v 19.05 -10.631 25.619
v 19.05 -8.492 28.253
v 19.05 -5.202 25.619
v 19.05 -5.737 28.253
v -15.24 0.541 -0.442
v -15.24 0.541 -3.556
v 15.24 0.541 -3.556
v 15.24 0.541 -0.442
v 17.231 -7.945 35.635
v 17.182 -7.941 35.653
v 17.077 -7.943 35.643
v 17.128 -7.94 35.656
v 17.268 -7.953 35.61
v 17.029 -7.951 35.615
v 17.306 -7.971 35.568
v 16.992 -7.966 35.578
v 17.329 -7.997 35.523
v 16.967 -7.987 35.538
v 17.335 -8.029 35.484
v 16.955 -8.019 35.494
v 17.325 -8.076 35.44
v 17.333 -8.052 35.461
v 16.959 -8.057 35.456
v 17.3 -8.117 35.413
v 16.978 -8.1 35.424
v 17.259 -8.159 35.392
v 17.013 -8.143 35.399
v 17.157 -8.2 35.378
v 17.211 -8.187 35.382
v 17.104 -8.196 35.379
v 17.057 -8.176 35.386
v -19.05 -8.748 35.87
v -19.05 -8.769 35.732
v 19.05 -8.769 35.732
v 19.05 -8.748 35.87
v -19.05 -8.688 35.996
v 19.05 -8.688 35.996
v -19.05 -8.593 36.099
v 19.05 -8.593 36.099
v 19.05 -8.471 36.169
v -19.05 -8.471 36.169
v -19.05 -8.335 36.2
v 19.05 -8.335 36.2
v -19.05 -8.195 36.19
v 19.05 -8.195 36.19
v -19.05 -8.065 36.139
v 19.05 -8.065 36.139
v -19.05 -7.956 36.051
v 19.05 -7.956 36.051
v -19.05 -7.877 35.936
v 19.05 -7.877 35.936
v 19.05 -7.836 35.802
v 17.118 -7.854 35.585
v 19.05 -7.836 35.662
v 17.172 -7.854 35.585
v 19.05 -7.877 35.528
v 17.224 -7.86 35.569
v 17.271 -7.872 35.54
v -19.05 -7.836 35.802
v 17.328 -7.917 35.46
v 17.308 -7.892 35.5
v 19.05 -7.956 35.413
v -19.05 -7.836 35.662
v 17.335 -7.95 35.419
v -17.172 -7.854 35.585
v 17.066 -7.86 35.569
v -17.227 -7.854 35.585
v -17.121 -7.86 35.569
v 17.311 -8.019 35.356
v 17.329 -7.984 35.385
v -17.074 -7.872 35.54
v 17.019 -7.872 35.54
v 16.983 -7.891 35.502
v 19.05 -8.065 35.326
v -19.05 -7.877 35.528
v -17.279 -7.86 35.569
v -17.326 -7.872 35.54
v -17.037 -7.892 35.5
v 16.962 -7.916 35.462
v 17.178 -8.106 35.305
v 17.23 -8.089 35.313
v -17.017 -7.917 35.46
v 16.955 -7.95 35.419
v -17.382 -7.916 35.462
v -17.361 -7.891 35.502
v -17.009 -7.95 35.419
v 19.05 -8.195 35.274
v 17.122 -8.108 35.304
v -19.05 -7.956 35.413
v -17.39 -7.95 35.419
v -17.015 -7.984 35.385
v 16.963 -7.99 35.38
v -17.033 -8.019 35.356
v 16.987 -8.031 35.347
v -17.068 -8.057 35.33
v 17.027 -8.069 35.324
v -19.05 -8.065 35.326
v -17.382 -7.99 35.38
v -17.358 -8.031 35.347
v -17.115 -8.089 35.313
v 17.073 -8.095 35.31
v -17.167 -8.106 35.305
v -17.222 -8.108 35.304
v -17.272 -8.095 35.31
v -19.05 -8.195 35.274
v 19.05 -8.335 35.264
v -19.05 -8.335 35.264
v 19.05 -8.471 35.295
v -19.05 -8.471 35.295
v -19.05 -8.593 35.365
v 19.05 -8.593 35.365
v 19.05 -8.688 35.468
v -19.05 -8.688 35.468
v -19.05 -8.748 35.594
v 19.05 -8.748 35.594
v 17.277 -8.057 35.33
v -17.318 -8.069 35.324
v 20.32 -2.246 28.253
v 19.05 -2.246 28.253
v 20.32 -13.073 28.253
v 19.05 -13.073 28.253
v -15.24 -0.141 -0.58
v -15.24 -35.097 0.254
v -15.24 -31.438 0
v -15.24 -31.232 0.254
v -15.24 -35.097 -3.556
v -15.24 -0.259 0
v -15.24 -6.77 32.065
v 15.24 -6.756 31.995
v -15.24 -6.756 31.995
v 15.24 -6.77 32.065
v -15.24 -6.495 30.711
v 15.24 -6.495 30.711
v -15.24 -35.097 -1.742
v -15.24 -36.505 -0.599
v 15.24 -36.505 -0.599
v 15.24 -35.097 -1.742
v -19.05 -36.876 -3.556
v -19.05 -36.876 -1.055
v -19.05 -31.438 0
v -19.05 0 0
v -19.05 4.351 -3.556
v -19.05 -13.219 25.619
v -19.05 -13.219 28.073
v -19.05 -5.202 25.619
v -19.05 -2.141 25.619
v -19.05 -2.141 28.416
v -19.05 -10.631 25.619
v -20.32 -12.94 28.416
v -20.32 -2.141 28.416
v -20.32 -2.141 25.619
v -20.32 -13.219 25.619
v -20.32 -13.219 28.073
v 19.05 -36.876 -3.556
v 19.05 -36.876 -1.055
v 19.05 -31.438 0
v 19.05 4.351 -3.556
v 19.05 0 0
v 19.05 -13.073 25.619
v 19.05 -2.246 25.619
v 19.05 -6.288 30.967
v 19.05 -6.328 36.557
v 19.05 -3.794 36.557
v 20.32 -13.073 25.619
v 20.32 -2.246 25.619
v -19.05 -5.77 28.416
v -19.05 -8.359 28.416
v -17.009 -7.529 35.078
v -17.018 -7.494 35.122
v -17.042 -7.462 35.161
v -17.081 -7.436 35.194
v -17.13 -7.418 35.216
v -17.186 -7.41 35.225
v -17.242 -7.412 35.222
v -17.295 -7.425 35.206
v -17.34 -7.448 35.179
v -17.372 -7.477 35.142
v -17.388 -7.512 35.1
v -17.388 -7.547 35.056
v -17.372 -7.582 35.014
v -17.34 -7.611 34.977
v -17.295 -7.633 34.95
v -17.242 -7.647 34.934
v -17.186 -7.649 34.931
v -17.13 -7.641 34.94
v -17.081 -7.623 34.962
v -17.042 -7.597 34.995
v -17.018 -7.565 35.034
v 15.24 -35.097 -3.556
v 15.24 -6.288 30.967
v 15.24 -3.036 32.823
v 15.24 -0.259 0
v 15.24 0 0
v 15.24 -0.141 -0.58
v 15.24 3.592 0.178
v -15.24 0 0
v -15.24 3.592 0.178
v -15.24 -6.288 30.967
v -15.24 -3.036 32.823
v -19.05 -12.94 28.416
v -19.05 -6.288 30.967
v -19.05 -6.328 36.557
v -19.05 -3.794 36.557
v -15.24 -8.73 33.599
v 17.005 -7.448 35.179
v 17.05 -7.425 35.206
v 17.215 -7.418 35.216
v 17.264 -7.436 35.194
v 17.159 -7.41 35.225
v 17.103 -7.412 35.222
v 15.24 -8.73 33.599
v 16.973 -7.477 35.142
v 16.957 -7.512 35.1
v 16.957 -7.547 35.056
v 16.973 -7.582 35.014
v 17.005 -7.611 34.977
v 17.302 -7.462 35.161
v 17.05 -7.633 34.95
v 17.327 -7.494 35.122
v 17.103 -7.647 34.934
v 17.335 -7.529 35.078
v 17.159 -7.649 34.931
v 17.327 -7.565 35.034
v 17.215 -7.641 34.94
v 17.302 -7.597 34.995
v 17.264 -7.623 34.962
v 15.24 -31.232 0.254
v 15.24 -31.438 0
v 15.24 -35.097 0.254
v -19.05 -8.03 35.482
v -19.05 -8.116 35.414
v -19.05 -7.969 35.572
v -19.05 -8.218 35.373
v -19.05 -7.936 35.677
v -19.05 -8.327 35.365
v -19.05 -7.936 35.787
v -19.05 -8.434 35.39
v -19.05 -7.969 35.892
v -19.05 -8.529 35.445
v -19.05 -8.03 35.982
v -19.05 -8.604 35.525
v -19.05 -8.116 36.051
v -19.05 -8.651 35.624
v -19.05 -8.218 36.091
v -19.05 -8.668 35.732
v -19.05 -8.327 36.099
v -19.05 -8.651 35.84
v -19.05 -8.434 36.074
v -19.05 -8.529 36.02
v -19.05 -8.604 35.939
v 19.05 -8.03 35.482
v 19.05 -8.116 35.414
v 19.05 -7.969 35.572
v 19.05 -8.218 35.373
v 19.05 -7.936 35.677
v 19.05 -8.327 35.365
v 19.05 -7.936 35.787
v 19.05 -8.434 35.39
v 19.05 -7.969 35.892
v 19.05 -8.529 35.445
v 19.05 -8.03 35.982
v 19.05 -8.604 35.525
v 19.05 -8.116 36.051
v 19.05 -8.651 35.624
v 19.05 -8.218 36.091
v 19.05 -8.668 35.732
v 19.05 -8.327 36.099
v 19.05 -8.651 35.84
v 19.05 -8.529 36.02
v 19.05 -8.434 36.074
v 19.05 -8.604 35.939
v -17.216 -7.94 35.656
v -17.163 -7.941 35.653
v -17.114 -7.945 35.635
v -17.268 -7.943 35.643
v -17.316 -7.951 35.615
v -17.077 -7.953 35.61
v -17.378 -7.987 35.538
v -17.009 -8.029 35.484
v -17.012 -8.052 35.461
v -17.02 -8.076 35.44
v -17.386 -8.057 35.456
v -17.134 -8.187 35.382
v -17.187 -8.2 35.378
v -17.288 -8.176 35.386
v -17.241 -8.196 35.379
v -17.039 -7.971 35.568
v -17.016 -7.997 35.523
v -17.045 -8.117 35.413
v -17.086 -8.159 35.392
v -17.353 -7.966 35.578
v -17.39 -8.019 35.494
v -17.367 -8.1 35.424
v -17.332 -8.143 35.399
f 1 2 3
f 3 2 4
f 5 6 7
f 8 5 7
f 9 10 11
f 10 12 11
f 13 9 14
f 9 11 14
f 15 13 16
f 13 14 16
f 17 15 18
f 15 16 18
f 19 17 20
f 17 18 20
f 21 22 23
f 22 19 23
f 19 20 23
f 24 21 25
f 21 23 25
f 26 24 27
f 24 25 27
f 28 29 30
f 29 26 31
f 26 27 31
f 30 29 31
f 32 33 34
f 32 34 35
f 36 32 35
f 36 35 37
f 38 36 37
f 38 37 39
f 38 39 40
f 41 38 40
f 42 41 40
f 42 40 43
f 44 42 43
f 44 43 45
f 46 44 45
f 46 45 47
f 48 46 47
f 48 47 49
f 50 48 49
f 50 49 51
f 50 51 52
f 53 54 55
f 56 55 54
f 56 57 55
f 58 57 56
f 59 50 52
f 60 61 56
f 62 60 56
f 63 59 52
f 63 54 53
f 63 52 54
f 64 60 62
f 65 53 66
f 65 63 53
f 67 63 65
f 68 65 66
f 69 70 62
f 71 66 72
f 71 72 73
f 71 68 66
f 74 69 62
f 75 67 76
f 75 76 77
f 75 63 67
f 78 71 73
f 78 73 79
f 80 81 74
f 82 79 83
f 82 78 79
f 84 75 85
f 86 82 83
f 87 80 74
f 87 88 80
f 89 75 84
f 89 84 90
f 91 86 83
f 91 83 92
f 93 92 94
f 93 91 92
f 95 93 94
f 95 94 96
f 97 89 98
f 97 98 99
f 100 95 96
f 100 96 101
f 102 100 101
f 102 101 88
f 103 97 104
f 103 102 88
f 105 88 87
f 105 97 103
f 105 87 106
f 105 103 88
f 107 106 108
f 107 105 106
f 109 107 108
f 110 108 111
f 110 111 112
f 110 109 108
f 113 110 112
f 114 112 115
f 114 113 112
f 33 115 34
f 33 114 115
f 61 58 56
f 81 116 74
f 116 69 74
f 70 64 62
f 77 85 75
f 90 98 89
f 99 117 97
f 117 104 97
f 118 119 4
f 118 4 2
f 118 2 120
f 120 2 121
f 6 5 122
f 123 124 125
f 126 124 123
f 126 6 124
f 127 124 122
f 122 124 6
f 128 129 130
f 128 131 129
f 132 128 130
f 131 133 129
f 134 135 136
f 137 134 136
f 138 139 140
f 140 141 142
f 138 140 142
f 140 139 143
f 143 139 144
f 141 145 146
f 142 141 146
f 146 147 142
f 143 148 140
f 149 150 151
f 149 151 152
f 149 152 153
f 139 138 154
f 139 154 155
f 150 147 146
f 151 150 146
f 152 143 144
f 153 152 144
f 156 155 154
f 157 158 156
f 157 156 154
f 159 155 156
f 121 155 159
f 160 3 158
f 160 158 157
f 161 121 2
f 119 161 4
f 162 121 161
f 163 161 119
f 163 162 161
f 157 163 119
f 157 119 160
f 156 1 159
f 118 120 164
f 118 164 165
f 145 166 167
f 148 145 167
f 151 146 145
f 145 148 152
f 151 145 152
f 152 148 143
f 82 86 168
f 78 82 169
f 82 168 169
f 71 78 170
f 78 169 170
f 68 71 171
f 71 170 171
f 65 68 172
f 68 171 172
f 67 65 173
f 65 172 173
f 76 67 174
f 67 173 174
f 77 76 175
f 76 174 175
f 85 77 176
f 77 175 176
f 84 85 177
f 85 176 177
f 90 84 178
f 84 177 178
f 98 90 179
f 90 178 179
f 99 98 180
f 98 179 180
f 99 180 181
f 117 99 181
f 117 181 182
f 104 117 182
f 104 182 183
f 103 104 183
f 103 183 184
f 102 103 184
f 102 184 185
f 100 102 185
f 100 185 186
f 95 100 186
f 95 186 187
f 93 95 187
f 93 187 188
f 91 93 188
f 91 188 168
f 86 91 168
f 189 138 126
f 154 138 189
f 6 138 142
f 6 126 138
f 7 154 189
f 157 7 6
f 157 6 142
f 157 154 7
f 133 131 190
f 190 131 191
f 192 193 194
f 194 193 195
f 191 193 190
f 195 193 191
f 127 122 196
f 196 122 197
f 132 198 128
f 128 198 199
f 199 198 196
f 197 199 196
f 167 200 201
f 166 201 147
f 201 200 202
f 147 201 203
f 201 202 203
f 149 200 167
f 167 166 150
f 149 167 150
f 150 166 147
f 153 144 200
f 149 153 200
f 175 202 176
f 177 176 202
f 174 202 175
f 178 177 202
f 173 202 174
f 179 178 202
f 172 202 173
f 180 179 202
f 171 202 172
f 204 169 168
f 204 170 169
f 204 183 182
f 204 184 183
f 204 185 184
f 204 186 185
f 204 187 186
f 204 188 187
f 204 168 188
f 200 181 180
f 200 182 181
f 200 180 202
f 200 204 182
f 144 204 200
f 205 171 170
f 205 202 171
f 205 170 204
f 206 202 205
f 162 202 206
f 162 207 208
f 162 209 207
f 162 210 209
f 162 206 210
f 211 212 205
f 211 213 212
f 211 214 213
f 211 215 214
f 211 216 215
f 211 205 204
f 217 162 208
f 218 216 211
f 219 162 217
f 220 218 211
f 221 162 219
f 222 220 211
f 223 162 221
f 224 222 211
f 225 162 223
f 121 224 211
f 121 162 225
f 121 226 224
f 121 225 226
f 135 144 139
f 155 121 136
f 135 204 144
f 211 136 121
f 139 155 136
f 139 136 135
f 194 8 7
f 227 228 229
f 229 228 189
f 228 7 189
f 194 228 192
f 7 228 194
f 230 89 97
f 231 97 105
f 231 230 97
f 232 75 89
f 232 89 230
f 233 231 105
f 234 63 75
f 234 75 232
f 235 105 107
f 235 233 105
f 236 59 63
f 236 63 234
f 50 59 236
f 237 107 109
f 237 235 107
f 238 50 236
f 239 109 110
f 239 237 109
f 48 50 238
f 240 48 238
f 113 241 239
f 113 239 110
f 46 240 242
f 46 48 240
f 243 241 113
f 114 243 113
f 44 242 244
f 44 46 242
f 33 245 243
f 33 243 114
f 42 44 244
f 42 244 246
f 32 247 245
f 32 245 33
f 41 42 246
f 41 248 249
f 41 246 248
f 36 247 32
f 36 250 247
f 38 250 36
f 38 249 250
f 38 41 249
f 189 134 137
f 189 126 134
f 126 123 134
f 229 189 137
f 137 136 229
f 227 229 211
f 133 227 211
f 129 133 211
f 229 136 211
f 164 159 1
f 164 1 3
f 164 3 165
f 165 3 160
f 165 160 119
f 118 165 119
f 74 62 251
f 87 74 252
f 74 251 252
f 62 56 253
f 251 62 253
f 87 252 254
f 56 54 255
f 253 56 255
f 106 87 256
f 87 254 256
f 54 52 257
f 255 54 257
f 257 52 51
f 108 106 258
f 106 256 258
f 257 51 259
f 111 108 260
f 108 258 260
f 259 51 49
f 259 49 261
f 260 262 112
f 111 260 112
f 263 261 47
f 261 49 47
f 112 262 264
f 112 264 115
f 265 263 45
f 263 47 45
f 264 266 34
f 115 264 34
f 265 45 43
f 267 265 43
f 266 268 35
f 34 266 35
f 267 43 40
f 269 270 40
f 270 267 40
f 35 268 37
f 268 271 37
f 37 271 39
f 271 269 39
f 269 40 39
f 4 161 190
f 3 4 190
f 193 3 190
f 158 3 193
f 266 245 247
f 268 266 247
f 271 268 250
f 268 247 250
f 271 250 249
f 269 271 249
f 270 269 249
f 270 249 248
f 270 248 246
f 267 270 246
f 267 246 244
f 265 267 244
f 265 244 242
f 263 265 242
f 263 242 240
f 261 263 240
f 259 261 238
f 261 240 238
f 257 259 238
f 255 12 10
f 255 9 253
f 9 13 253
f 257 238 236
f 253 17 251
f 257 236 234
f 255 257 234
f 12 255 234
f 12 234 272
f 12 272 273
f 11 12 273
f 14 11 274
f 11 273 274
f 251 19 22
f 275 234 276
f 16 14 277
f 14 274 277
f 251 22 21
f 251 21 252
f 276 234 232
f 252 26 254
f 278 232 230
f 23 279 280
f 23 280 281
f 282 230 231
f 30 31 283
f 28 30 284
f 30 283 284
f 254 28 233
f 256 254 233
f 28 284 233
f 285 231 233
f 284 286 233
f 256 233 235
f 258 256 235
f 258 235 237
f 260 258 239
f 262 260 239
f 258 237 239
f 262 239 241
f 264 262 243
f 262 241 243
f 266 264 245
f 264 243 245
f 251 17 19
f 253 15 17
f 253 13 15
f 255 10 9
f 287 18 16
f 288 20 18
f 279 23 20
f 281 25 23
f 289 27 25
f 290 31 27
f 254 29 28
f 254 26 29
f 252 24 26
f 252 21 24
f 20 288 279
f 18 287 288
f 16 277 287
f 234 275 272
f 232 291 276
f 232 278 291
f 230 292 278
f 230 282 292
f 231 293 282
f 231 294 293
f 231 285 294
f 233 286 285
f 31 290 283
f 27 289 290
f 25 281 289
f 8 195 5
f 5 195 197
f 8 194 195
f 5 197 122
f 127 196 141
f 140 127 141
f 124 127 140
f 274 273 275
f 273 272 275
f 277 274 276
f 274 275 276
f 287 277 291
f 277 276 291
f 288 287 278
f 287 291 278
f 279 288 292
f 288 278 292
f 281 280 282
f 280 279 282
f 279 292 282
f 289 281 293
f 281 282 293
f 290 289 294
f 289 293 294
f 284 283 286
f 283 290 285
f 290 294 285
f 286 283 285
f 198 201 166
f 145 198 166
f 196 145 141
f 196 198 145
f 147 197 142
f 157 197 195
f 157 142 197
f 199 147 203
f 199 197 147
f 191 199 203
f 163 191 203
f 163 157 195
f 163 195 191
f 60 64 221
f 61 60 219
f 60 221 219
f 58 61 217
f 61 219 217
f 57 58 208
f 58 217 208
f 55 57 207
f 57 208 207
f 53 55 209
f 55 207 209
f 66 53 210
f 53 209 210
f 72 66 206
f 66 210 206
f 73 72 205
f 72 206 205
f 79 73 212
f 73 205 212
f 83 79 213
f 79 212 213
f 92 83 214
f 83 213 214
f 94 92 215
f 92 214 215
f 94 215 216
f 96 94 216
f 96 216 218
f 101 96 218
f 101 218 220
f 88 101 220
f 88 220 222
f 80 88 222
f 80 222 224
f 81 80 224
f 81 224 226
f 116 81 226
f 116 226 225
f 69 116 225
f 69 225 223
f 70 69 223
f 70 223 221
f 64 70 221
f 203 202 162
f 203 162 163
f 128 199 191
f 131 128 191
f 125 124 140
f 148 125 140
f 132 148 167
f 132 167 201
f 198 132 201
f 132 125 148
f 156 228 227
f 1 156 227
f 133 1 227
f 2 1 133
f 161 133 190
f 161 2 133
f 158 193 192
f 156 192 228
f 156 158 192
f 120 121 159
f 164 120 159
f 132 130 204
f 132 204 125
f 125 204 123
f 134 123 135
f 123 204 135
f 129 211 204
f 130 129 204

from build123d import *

# Parameters (mm, degrees)
F1_DEPTH  = 19.05
F3_DEPTH  = 50.8
F6_DEPTH  = 1.27
F7_DEPTH  = 1.27
F9_DEPTH  = 4.064
F11_DEPTH = 3.81
F12_W     = 30.4800014411
F12_H     = 35.6379195737
F13_DEPTH = 3.81
F14_R     = 0.1905
F15_DEPTH = 1.016
F17_DEPTH = 50.8
F18_R     = 0.4693884444
F18_R_2   = 0.3677883594
F19_DEPTH = 38.0999
F20_DEPTH = 42.8752


with BuildPart() as f1:
    # F0 (on Right) → F1 (new body, symmetric)
    with BuildSketch(Plane.YZ):
        Polygon((-4.300991216, 39.0530479294), (-38.9073263628, -3.5559992527), (4.3505917698, -3.5559992527), align=None)
        Polygon((-6.2876227312, 30.9665426612), (0, 0), (-31.4381159842, 0), align=None, mode=Mode.SUBTRACT)
    extrude(amount=F1_DEPTH, both=True)

    # F2 (on face) → F3 (cut)
    with BuildSketch(Plane.YZ.offset(19.05)):
        Polygon((-6.3284697347, 36.5567151771), (-3.7941216332, 36.5567151771), (-4.300991216, 39.0530479294), align=None)
    extrude(amount=-F3_DEPTH, mode=Mode.SUBTRACT)

    # F5 (on face) → F6 (join)
    with BuildSketch(Plane(origin=(-19.05, 0, 0), x_dir=(0, -1, 0), z_dir=(-1, 0, 0))):
        Polygon((5.7698168155, 28.4163484679), (2.1412553343, 28.4163484679), (2.1412553343, 25.6189145148), (5.2018099345, 25.6189145148), align=None)
        Polygon((8.3588465857, 28.4163484679), (5.7698168155, 28.4163484679), (5.2018099345, 25.6189145148), (10.6308743201, 25.6189145148), align=None)
        Polygon((12.9399355427, 28.4163484679), (8.3588465857, 28.4163484679), (10.6308743201, 25.6189145148), (13.2188182324, 25.6189145148), (13.2188182324, 28.0729741801), align=None)
    extrude(amount=F6_DEPTH)

    # F4 (on face) → F7 (join)
    with BuildSketch(Plane.YZ.offset(19.05)):
        Polygon((-8.4918548826, 28.2525820137), (-13.0729438396, 28.2525820137), (-13.0729438396, 25.6189145148), (-10.6308743201, 25.6189145148), align=None)
        Polygon((-2.2463577334, 28.2525820137), (-5.7365647443, 28.2525820137), (-5.2018099345, 25.6189145148), (-2.2463577334, 25.6189145148), align=None)
        Polygon((-5.7365647443, 28.2525820137), (-8.4918548826, 28.2525820137), (-10.6308743201, 25.6189145148), (-5.2018099345, 25.6189145148), align=None)
    extrude(amount=F7_DEPTH)

    # F8 (on face) → F9 (cut)
    with BuildSketch(Plane(origin=(0, -21.7030111813, 17.6268123393), x_dir=(1, 0, 0), z_dir=(0, -0.7762344906, 0.6304443002))):
        Polygon((-15.2399991697, 13.4574822013), (-15.2399991697, -23.4791905796), (15.2399991697, -23.4791905796), (15.2399991697, 13.688865676), (15.2399991697, 13.8253802434), (15.2399991697, 20.5768346786), (-15.2399991697, 20.5768346786), (-15.2399991697, 13.8998411689), align=None)
    extrude(amount=-F9_DEPTH, mode=Mode.SUBTRACT)

    # F10 (on face) → F11 (cut)
    with BuildSketch(Plane(origin=(0, 3.4848880888, 0.7075914739), x_dir=(-1, 0, 0), z_dir=(0, 0.9800024806, 0.1989852707))):
        Polygon((15.2400027211, 32.7706485987), (-15.2400027211, 32.7706485987), (-15.2400027211, -0.5405944909), (15.2400027211, -0.5405944909), (15.2400027211, 28.2741702614), align=None)
    extrude(amount=-F11_DEPTH, mode=Mode.SUBTRACT)

    # F12 (on face) → F13 (cut)
    with BuildSketch(Plane(origin=(0, 0, -3.5559992527), x_dir=(1, 0, 0), z_dir=(0, 0, -1))):
        with Locations((0, 17.2783672965)):
            Rectangle(F12_W, F12_H)
    extrude(amount=-F13_DEPTH, mode=Mode.SUBTRACT)

    # F14 (on face) → F15 (join)
    with BuildSketch(Plane(origin=(0, -21.7030111813, 17.6268123393), x_dir=(1, 0, 0), z_dir=(0, -0.7762344906, 0.6304443002))):
        with Locations((-17.1998851001, 22.4818350938)):
            Circle(F14_R)
        with Locations((17.1449995848, 22.4818350938)):
            Circle(F14_R)
    extrude(amount=F15_DEPTH)

    # F16 (on face) → F17 (cut)
    with BuildSketch(Plane.YZ.offset(19.05)):
        Polygon((-38.9073263628, -3.5559992527), (-36.8760041893, -3.5559992527), (-36.8760041893, -1.0549340007), align=None)
    extrude(amount=-F17_DEPTH, mode=Mode.SUBTRACT)

    # F18 (on face) → F19 (join)
    with BuildSketch(Plane(origin=(-19.05, 0, 0), x_dir=(0, -1, 0), z_dir=(-1, 0, 0))):
        with Locations((8.2998776285, 35.7320597078)):
            Circle(F18_R)
        with Locations((8.2998776285, 35.7320597078)):
            Circle(F18_R_2, mode=Mode.SUBTRACT)
    extrude(amount=-F19_DEPTH)

    # F18 (on face) → F20 (cut)
    with BuildSketch(Plane(origin=(-19.05, 0, 0), x_dir=(0, -1, 0), z_dir=(-1, 0, 0))):
        with Locations((8.2998776285, 35.7320597078)):
            Circle(F18_R_2)
    extrude(amount=-F20_DEPTH, mode=Mode.SUBTRACT)


solid = f1.part
